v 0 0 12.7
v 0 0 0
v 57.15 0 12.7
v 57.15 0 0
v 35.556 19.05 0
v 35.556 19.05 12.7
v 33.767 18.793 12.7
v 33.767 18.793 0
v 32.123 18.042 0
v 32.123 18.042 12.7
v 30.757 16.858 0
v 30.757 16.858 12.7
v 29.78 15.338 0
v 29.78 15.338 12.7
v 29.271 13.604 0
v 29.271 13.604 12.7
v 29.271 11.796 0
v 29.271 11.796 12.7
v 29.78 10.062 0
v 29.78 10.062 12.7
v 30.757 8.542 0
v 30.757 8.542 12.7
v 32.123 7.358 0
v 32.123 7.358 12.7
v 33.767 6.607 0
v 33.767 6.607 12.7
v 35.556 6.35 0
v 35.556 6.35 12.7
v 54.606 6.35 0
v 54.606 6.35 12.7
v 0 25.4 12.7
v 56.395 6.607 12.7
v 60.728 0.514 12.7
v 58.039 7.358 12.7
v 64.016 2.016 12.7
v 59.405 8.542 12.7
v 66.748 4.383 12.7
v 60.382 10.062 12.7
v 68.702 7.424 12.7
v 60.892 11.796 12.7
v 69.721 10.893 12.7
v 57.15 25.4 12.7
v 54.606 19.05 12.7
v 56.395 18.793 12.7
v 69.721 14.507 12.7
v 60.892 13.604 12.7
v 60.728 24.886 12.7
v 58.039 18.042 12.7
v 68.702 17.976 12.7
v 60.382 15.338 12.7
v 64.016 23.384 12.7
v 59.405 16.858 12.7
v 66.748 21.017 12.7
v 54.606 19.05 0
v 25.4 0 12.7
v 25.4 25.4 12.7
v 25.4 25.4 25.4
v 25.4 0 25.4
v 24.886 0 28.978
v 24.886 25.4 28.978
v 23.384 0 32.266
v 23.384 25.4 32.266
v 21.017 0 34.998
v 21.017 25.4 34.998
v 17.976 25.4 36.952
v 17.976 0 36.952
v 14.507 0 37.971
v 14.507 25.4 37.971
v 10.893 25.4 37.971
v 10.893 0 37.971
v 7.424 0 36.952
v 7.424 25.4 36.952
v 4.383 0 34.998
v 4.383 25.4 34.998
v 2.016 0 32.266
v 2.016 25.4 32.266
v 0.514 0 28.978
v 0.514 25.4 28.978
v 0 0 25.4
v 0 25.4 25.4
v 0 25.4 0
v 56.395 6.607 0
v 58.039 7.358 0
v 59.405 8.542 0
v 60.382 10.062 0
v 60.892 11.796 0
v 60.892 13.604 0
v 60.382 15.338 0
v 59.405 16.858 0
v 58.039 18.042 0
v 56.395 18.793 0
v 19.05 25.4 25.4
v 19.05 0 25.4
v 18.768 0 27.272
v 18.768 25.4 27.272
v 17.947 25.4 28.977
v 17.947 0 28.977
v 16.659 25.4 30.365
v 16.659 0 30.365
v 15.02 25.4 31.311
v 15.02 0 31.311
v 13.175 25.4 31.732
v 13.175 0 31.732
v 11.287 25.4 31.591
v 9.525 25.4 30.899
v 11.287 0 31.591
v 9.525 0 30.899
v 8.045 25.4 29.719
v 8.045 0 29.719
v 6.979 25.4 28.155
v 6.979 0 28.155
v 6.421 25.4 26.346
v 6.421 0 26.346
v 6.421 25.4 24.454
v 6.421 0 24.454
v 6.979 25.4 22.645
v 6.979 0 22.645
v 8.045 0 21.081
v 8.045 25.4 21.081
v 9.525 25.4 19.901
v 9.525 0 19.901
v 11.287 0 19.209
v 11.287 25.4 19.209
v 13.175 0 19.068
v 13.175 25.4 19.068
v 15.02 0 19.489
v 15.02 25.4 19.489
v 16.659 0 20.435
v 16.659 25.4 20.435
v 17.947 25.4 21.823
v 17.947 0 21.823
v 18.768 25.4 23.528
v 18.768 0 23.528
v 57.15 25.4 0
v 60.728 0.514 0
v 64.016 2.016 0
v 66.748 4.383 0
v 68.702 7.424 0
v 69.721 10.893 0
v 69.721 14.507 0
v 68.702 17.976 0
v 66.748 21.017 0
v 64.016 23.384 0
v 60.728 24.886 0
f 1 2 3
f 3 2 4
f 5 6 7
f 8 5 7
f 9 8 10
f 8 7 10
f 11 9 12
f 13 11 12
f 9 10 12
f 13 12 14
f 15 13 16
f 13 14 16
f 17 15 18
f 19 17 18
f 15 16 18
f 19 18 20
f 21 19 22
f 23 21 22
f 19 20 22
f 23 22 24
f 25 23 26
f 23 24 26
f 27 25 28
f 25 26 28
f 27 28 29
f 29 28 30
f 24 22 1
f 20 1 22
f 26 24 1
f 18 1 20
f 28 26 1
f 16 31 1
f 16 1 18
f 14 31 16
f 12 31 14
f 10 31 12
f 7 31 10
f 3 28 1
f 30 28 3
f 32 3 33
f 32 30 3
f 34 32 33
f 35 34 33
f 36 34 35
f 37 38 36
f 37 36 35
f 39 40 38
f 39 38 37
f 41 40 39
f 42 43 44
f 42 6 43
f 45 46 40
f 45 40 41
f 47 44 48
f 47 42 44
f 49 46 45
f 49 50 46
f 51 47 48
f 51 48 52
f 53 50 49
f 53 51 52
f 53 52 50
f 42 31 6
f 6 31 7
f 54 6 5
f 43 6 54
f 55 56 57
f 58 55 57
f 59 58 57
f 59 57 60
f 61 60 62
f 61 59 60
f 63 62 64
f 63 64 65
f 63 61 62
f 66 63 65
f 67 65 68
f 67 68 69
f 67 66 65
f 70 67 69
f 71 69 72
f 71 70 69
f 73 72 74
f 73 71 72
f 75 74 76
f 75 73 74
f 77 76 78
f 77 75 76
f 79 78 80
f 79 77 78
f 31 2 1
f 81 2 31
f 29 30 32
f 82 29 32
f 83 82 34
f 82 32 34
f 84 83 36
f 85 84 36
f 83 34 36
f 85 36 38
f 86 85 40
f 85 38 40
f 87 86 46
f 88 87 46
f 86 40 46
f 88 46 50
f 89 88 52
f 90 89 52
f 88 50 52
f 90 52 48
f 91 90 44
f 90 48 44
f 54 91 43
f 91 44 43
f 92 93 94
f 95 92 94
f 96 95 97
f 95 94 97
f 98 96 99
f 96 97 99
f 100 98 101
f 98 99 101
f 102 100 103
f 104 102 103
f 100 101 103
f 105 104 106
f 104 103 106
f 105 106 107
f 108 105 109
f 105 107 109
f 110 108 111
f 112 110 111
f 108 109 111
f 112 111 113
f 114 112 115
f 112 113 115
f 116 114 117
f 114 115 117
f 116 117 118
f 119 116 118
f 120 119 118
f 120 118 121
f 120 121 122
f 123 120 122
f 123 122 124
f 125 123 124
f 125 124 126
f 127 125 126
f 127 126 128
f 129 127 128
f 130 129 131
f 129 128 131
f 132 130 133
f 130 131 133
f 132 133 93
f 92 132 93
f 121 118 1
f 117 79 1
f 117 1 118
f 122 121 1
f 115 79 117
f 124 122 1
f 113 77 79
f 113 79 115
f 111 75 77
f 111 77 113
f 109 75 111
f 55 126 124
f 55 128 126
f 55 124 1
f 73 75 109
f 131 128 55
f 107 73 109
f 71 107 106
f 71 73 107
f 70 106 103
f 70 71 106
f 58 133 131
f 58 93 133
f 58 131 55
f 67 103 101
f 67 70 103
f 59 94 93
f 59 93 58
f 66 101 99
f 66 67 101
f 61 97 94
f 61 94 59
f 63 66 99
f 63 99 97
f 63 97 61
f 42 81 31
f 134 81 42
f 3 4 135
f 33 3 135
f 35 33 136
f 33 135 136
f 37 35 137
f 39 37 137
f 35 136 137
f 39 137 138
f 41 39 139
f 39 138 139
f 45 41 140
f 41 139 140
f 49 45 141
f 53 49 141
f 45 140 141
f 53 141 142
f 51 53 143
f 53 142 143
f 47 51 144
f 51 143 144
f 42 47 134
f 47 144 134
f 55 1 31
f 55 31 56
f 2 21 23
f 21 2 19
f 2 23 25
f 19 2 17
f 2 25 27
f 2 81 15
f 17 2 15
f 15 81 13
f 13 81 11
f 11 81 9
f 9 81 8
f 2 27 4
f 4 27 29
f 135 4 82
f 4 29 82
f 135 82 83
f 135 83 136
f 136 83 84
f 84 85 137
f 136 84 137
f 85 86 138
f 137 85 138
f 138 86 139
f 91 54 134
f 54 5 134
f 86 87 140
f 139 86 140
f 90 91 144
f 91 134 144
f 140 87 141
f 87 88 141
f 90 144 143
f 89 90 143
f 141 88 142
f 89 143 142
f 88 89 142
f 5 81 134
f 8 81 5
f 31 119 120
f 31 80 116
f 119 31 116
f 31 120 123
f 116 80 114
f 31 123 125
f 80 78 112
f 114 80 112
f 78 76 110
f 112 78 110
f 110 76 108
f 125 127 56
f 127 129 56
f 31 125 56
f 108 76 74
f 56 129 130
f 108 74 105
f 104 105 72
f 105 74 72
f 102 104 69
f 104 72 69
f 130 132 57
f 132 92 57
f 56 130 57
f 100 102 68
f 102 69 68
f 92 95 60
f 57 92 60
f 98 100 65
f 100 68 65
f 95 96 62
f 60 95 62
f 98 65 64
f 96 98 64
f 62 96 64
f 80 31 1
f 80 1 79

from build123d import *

# Parameters (mm, degrees)
F0_W     = 57.15
F0_H     = 25.4
F1_DEPTH = 12.7
F2_DEPTH = 12.7
F3_W     = 25.4
F3_H     = 12.7
F4_DEPTH = 25.4
F5_R     = 6.35
F6_DEPTH = 25.4
F7_W     = 19.05
F7_H     = 12.7
F8_DEPTH = 25.4


with BuildPart() as f1:
    # F0 (on Top) → F1 (new body)
    with BuildSketch(Plane.XY):
        with Locations((28.575, 12.7)):
            Rectangle(F0_W, F0_H)
    extrude(amount=F1_DEPTH)

    # F0 (on Top) → F2 (join)
    with BuildSketch(Plane.XY):
        with Locations((28.575, 12.7)):
            Rectangle(F0_W, F0_H)
        with BuildLine():
            Line((57.15, 25.4), (57.15, 0))
            ThreePointArc((57.15, 0), (69.85, 12.7), (57.15, 25.4))
        make_face()
    extrude(amount=F2_DEPTH)

    # F7 (on face) → F8 (cut)
    with BuildSketch(Plane.XY.offset(12.7)):
        with BuildLine():
            ThreePointArc((54.606163, 6.35), (60.956163, 12.7), (54.606163, 19.05))
            Line((54.606163, 19.05), (54.606163, 6.35))
        make_face()
        with Locations((45.081163, 12.7)):
            Rectangle(F7_W, F7_H)
        with BuildLine():
            Line((35.556163, 6.35), (35.556163, 19.05))
            ThreePointArc((35.556163, 19.05), (29.206163, 12.7), (35.556163, 6.35))
        make_face()
    extrude(amount=-F8_DEPTH, mode=Mode.SUBTRACT)


with BuildPart() as f4:
    # F3 (on face) → F4 (new body)
    with BuildSketch(Plane.XZ):
        with Locations((12.7, 19.05)):
            Rectangle(F3_W, F3_H)
        with BuildLine():
            ThreePointArc((25.4, 25.4), (12.7, 38.1), (0, 25.4))
            Line((0, 25.4), (25.4, 25.4))
        make_face()
    extrude(amount=-F4_DEPTH)

    # F5 (on face) → F6 (cut)
    with BuildSketch(Plane.XZ):
        with Locations((12.7, 25.4)):
            Circle(F5_R)
    extrude(amount=-F6_DEPTH, mode=Mode.SUBTRACT)


solid = Compound([f1.part, f4.part])
